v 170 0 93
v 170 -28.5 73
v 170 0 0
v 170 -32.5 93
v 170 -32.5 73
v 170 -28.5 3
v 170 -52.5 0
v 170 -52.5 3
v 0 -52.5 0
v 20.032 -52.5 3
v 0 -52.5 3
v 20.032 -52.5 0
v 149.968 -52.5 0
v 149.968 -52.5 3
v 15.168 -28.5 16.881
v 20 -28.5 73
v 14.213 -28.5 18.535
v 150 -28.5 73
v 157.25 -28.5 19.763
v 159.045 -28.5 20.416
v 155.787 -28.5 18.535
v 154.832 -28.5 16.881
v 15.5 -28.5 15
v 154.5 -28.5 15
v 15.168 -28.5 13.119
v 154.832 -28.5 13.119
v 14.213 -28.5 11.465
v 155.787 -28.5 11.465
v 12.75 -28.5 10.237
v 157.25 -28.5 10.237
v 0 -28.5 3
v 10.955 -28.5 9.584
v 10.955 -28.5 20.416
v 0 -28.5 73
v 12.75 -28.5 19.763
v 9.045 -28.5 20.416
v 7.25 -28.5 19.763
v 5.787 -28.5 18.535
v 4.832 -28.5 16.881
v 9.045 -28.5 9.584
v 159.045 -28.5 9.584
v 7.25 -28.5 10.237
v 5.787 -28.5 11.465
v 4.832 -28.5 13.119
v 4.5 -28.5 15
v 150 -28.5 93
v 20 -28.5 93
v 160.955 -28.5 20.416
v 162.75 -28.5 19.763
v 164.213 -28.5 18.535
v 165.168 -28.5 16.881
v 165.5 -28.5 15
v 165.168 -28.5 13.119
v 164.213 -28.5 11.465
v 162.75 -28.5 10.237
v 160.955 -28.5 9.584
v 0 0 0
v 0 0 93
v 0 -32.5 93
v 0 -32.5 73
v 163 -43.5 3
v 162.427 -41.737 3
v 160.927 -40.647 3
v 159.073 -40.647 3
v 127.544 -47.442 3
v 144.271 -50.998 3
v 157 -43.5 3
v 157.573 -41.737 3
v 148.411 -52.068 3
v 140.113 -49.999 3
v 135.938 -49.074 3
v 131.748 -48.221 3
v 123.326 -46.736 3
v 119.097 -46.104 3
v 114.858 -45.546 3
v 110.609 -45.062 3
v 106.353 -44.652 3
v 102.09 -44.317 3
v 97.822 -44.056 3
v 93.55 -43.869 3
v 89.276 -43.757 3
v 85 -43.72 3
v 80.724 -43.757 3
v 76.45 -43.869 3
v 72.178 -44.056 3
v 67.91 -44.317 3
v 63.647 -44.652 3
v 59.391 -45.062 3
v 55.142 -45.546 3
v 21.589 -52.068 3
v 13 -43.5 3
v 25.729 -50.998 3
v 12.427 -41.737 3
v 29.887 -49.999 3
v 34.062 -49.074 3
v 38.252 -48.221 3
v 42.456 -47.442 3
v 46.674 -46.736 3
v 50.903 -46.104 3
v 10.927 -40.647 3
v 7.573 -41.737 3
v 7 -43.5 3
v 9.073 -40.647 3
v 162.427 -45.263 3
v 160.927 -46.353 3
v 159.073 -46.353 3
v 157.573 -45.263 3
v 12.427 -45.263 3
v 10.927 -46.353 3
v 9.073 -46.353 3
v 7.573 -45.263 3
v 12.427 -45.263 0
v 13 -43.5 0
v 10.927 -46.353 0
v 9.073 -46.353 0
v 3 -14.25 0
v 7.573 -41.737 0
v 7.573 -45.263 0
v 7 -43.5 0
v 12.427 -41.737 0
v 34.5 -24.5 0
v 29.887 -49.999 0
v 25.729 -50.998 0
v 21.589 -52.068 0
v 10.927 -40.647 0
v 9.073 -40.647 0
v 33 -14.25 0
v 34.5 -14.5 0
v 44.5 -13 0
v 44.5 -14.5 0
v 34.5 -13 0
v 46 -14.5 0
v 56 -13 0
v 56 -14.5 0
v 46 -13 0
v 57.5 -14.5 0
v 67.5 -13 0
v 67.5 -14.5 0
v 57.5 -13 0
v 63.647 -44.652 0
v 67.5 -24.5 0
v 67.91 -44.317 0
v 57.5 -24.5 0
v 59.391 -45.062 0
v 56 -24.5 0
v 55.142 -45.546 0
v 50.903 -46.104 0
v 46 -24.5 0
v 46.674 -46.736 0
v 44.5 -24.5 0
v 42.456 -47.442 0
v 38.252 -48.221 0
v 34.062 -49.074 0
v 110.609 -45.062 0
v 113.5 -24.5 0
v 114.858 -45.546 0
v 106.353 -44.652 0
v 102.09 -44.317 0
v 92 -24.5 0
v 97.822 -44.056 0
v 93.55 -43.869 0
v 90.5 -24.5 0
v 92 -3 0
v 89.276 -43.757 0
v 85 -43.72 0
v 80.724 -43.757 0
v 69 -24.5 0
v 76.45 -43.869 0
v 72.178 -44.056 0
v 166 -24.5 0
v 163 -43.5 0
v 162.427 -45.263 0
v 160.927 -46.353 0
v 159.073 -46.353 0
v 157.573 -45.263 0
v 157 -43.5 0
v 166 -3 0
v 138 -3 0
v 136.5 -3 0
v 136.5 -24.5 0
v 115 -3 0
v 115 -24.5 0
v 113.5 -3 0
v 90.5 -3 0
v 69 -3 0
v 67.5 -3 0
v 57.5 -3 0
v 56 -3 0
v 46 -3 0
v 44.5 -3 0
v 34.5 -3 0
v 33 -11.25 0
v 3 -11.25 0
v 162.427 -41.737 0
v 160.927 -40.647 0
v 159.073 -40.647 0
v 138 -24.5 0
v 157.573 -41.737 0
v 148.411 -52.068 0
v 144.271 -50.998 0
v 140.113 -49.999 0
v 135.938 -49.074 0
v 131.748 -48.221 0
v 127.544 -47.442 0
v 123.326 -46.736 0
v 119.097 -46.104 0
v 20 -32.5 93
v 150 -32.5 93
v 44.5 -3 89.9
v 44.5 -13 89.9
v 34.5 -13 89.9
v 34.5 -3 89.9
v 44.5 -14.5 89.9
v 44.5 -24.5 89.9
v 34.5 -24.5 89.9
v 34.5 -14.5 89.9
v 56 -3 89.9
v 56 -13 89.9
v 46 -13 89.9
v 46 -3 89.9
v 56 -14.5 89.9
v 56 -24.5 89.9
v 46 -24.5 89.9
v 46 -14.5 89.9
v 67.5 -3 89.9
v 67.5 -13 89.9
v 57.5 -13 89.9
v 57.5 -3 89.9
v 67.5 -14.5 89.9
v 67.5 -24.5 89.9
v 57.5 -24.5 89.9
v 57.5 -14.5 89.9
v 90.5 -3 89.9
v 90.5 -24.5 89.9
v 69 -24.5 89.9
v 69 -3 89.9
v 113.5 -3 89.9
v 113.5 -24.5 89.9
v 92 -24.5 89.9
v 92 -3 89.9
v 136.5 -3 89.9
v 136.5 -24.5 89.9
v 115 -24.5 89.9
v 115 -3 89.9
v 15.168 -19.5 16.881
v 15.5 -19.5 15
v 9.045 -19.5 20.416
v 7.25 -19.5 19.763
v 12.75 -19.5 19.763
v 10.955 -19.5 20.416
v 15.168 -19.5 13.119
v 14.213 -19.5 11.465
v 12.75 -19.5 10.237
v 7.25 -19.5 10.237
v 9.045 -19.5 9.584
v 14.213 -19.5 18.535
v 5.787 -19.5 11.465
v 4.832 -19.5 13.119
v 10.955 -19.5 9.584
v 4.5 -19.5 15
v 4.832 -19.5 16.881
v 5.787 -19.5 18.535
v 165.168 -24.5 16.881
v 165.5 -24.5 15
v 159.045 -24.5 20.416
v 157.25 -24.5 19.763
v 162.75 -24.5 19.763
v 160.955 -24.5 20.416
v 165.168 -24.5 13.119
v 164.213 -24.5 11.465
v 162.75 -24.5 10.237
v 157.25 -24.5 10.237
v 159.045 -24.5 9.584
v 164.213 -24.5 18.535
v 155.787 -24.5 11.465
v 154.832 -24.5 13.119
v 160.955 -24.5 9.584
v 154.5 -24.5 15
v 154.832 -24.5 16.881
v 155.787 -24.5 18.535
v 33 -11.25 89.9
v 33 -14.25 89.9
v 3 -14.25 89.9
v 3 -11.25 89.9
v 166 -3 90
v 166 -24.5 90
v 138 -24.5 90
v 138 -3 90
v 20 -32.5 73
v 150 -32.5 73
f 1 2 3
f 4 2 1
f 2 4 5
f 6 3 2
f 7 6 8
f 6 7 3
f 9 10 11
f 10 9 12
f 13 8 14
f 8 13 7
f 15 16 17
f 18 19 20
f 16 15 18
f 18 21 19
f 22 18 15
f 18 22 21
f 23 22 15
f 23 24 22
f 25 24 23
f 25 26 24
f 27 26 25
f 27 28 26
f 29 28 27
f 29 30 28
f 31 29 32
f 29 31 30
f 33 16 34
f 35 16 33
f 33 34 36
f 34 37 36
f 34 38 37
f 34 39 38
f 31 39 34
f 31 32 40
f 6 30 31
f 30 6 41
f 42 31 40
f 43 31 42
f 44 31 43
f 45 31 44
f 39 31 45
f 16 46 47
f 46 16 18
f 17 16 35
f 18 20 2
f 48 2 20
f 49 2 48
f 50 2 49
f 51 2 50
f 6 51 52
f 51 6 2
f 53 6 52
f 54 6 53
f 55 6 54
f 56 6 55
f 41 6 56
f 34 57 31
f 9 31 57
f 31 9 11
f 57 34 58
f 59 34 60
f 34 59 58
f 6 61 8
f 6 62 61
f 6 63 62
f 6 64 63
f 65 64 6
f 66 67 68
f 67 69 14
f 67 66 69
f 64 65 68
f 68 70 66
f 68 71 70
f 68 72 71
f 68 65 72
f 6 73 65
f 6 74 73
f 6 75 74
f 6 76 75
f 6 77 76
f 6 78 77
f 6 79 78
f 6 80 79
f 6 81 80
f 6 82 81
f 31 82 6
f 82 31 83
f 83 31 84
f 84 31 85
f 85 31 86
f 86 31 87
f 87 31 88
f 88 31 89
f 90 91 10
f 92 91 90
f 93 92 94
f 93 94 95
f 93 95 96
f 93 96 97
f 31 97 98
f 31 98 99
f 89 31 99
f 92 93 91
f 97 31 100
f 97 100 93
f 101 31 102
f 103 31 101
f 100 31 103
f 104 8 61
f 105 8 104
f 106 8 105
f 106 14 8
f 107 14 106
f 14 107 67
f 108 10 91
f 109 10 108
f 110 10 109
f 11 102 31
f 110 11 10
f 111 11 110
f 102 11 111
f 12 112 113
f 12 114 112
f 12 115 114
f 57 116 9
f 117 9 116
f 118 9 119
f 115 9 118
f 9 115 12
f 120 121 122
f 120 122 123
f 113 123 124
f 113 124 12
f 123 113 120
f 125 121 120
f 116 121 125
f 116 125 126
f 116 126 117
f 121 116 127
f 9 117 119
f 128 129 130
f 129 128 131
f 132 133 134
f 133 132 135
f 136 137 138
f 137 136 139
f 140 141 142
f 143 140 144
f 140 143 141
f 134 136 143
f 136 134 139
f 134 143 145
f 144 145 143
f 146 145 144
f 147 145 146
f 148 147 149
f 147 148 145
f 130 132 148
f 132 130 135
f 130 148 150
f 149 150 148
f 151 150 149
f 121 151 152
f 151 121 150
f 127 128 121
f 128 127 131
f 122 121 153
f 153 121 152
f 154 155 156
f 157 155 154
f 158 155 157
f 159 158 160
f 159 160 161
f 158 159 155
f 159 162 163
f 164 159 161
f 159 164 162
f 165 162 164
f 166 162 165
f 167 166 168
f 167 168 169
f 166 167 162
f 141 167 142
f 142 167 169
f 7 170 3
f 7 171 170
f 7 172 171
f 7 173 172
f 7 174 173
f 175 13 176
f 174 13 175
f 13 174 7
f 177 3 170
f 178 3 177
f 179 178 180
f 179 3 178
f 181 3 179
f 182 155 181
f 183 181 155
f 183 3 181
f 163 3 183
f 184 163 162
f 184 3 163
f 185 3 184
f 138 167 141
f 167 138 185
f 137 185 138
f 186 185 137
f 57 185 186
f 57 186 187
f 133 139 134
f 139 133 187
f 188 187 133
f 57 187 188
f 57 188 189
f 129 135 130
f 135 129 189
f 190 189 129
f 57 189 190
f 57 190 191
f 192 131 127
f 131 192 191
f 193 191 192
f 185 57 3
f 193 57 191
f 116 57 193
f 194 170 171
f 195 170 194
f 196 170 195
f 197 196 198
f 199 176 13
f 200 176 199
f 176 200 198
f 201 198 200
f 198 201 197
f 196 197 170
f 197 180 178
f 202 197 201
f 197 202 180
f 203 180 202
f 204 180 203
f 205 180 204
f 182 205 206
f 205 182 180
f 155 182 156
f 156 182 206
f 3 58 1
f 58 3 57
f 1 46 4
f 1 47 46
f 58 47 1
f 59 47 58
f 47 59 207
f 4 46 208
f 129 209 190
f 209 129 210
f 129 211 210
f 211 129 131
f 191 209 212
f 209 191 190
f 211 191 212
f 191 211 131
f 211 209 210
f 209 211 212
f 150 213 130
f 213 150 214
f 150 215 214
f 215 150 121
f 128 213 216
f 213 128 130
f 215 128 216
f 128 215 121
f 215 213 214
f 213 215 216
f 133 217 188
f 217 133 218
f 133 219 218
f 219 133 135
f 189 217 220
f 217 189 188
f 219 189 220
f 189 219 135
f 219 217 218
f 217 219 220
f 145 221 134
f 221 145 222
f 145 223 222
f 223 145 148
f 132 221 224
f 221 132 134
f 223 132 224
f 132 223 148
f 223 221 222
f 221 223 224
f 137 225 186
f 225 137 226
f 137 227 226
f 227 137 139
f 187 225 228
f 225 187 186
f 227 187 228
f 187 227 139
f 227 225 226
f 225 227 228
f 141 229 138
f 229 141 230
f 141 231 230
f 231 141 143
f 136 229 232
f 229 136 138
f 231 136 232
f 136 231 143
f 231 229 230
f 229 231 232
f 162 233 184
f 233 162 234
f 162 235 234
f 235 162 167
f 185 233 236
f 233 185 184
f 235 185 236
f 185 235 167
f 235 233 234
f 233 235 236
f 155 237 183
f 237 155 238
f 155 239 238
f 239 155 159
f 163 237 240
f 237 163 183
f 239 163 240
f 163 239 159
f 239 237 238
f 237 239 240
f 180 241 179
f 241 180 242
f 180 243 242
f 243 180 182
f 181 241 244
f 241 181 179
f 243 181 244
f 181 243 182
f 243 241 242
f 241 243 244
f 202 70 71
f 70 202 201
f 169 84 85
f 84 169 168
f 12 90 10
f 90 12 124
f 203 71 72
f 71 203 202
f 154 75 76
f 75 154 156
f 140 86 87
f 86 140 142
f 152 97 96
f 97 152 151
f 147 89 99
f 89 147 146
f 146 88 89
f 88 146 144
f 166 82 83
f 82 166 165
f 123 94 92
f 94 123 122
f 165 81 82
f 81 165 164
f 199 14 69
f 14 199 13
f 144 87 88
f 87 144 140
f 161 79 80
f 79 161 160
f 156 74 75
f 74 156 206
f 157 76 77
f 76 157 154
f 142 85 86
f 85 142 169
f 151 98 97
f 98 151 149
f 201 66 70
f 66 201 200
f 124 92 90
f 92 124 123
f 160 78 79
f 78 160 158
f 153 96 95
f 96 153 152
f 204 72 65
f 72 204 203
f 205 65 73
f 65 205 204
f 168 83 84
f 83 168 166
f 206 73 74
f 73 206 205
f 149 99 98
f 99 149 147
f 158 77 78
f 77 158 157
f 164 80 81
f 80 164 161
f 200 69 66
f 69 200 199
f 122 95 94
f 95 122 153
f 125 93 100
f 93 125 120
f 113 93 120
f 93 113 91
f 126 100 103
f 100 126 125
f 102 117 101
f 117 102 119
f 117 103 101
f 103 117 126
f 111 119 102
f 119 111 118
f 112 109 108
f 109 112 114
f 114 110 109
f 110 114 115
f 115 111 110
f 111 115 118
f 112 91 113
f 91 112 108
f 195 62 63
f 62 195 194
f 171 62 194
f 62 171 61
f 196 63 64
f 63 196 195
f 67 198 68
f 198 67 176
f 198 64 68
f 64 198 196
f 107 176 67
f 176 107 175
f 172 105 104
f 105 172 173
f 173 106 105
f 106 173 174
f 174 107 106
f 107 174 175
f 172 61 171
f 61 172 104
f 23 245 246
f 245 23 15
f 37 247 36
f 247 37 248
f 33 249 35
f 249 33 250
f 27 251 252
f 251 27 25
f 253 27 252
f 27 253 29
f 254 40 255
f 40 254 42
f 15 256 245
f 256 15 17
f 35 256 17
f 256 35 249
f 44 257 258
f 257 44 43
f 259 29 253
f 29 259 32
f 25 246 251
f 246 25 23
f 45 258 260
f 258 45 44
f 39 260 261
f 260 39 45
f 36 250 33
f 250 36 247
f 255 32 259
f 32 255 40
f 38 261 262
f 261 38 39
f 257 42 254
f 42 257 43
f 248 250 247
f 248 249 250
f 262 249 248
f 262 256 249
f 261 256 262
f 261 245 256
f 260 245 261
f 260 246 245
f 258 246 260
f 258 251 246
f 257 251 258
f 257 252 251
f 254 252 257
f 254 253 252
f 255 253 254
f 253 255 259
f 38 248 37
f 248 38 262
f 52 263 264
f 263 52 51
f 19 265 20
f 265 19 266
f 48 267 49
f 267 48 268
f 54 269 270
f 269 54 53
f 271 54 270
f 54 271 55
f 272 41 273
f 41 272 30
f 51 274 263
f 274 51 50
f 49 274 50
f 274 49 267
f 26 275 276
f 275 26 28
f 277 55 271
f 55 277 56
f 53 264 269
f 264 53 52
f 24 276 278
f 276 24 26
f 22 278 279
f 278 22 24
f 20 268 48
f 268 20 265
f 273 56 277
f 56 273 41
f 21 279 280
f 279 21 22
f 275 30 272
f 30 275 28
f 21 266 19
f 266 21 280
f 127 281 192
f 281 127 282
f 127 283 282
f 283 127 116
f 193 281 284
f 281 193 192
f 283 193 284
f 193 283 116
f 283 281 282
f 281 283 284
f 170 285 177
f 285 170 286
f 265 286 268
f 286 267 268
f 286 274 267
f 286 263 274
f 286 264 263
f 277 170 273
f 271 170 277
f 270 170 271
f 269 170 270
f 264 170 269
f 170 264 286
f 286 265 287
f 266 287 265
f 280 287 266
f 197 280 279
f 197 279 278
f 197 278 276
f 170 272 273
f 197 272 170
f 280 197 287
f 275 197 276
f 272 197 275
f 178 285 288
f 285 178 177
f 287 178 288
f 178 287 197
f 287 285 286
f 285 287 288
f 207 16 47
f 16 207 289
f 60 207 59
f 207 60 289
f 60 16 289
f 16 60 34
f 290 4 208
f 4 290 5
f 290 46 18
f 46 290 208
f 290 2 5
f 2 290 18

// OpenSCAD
//Height
h=90; //[10:250]

//Knife compartments?
knife=1; //[yes=1, no=0]

//Number of small (10x10mm) compartments
small=6; //[0:28]

//Number of big (20x20mm) compartments
big=3; //[0:11]


/* [Hidden] */
//Thilness of the box. Do not modifie this now, may be use in future release.
e=28.5; //[26.5]


rotate([90,0,0])union()
{
	difference()
	{
		union()
		{
			translate([0,0,e])cube([170,3,24]);
			cube([170,h+3,e]);
		}
		translate([170/2,-0.1,288.72])rotate([-90,0,0])cylinder(r=245,h=3.2,$fs=0.1,$fa=1);
		translate([10,-0.1,43.5])rotate([-90,0,0])cylinder(r=3,h=3.2);
		translate([160,-0.1,43.5])rotate([-90,0,0])cylinder(r=3,h=3.2);
		translate([10,15,e-9])cylinder(r=11/2, h=10.1);
		translate([10,15,e-7])cylinder(r=11/2, h=7.1);
		translate([160,15,e-7])cylinder(r=11/2, h=7.1);
		if(knife)
		{
			translate([3,-0.2,11.25])cube([30,h+0.1,3]);
		}
	

		if(small!=0)for (i = [0:small/2-1])
		{
			translate([3+knife*31.5+i*11.5, -0.2,3])cube([10,h+0.1,10]);
			translate([3+knife*31.5+i*11.5, -0.2,14.5])cube([10,h+0.1,10]);
		}

		if(big!=0)for(i=[small/2:small/2+big-1])
		{
			translate([3+knife*31.5+(small/2)*11.5+(i-small/2)*23, -0.2,3])cube([21.5,h+0.1,21.5]);
		}
	
		translate([3+knife*31.5+(small/2)*11.5+(small/2+big-small/2)*23, -0.1,3])cube([168-(3+knife*31.5+(small/2)*11.5+(small/2+big-small/2)*23)-2,h+0.1,21.5]);
	}
	translate([0,h+3-20,e])cube([20,20,4]);
	translate([170-20,h+3-20,e])cube([20,20,4]);
}

